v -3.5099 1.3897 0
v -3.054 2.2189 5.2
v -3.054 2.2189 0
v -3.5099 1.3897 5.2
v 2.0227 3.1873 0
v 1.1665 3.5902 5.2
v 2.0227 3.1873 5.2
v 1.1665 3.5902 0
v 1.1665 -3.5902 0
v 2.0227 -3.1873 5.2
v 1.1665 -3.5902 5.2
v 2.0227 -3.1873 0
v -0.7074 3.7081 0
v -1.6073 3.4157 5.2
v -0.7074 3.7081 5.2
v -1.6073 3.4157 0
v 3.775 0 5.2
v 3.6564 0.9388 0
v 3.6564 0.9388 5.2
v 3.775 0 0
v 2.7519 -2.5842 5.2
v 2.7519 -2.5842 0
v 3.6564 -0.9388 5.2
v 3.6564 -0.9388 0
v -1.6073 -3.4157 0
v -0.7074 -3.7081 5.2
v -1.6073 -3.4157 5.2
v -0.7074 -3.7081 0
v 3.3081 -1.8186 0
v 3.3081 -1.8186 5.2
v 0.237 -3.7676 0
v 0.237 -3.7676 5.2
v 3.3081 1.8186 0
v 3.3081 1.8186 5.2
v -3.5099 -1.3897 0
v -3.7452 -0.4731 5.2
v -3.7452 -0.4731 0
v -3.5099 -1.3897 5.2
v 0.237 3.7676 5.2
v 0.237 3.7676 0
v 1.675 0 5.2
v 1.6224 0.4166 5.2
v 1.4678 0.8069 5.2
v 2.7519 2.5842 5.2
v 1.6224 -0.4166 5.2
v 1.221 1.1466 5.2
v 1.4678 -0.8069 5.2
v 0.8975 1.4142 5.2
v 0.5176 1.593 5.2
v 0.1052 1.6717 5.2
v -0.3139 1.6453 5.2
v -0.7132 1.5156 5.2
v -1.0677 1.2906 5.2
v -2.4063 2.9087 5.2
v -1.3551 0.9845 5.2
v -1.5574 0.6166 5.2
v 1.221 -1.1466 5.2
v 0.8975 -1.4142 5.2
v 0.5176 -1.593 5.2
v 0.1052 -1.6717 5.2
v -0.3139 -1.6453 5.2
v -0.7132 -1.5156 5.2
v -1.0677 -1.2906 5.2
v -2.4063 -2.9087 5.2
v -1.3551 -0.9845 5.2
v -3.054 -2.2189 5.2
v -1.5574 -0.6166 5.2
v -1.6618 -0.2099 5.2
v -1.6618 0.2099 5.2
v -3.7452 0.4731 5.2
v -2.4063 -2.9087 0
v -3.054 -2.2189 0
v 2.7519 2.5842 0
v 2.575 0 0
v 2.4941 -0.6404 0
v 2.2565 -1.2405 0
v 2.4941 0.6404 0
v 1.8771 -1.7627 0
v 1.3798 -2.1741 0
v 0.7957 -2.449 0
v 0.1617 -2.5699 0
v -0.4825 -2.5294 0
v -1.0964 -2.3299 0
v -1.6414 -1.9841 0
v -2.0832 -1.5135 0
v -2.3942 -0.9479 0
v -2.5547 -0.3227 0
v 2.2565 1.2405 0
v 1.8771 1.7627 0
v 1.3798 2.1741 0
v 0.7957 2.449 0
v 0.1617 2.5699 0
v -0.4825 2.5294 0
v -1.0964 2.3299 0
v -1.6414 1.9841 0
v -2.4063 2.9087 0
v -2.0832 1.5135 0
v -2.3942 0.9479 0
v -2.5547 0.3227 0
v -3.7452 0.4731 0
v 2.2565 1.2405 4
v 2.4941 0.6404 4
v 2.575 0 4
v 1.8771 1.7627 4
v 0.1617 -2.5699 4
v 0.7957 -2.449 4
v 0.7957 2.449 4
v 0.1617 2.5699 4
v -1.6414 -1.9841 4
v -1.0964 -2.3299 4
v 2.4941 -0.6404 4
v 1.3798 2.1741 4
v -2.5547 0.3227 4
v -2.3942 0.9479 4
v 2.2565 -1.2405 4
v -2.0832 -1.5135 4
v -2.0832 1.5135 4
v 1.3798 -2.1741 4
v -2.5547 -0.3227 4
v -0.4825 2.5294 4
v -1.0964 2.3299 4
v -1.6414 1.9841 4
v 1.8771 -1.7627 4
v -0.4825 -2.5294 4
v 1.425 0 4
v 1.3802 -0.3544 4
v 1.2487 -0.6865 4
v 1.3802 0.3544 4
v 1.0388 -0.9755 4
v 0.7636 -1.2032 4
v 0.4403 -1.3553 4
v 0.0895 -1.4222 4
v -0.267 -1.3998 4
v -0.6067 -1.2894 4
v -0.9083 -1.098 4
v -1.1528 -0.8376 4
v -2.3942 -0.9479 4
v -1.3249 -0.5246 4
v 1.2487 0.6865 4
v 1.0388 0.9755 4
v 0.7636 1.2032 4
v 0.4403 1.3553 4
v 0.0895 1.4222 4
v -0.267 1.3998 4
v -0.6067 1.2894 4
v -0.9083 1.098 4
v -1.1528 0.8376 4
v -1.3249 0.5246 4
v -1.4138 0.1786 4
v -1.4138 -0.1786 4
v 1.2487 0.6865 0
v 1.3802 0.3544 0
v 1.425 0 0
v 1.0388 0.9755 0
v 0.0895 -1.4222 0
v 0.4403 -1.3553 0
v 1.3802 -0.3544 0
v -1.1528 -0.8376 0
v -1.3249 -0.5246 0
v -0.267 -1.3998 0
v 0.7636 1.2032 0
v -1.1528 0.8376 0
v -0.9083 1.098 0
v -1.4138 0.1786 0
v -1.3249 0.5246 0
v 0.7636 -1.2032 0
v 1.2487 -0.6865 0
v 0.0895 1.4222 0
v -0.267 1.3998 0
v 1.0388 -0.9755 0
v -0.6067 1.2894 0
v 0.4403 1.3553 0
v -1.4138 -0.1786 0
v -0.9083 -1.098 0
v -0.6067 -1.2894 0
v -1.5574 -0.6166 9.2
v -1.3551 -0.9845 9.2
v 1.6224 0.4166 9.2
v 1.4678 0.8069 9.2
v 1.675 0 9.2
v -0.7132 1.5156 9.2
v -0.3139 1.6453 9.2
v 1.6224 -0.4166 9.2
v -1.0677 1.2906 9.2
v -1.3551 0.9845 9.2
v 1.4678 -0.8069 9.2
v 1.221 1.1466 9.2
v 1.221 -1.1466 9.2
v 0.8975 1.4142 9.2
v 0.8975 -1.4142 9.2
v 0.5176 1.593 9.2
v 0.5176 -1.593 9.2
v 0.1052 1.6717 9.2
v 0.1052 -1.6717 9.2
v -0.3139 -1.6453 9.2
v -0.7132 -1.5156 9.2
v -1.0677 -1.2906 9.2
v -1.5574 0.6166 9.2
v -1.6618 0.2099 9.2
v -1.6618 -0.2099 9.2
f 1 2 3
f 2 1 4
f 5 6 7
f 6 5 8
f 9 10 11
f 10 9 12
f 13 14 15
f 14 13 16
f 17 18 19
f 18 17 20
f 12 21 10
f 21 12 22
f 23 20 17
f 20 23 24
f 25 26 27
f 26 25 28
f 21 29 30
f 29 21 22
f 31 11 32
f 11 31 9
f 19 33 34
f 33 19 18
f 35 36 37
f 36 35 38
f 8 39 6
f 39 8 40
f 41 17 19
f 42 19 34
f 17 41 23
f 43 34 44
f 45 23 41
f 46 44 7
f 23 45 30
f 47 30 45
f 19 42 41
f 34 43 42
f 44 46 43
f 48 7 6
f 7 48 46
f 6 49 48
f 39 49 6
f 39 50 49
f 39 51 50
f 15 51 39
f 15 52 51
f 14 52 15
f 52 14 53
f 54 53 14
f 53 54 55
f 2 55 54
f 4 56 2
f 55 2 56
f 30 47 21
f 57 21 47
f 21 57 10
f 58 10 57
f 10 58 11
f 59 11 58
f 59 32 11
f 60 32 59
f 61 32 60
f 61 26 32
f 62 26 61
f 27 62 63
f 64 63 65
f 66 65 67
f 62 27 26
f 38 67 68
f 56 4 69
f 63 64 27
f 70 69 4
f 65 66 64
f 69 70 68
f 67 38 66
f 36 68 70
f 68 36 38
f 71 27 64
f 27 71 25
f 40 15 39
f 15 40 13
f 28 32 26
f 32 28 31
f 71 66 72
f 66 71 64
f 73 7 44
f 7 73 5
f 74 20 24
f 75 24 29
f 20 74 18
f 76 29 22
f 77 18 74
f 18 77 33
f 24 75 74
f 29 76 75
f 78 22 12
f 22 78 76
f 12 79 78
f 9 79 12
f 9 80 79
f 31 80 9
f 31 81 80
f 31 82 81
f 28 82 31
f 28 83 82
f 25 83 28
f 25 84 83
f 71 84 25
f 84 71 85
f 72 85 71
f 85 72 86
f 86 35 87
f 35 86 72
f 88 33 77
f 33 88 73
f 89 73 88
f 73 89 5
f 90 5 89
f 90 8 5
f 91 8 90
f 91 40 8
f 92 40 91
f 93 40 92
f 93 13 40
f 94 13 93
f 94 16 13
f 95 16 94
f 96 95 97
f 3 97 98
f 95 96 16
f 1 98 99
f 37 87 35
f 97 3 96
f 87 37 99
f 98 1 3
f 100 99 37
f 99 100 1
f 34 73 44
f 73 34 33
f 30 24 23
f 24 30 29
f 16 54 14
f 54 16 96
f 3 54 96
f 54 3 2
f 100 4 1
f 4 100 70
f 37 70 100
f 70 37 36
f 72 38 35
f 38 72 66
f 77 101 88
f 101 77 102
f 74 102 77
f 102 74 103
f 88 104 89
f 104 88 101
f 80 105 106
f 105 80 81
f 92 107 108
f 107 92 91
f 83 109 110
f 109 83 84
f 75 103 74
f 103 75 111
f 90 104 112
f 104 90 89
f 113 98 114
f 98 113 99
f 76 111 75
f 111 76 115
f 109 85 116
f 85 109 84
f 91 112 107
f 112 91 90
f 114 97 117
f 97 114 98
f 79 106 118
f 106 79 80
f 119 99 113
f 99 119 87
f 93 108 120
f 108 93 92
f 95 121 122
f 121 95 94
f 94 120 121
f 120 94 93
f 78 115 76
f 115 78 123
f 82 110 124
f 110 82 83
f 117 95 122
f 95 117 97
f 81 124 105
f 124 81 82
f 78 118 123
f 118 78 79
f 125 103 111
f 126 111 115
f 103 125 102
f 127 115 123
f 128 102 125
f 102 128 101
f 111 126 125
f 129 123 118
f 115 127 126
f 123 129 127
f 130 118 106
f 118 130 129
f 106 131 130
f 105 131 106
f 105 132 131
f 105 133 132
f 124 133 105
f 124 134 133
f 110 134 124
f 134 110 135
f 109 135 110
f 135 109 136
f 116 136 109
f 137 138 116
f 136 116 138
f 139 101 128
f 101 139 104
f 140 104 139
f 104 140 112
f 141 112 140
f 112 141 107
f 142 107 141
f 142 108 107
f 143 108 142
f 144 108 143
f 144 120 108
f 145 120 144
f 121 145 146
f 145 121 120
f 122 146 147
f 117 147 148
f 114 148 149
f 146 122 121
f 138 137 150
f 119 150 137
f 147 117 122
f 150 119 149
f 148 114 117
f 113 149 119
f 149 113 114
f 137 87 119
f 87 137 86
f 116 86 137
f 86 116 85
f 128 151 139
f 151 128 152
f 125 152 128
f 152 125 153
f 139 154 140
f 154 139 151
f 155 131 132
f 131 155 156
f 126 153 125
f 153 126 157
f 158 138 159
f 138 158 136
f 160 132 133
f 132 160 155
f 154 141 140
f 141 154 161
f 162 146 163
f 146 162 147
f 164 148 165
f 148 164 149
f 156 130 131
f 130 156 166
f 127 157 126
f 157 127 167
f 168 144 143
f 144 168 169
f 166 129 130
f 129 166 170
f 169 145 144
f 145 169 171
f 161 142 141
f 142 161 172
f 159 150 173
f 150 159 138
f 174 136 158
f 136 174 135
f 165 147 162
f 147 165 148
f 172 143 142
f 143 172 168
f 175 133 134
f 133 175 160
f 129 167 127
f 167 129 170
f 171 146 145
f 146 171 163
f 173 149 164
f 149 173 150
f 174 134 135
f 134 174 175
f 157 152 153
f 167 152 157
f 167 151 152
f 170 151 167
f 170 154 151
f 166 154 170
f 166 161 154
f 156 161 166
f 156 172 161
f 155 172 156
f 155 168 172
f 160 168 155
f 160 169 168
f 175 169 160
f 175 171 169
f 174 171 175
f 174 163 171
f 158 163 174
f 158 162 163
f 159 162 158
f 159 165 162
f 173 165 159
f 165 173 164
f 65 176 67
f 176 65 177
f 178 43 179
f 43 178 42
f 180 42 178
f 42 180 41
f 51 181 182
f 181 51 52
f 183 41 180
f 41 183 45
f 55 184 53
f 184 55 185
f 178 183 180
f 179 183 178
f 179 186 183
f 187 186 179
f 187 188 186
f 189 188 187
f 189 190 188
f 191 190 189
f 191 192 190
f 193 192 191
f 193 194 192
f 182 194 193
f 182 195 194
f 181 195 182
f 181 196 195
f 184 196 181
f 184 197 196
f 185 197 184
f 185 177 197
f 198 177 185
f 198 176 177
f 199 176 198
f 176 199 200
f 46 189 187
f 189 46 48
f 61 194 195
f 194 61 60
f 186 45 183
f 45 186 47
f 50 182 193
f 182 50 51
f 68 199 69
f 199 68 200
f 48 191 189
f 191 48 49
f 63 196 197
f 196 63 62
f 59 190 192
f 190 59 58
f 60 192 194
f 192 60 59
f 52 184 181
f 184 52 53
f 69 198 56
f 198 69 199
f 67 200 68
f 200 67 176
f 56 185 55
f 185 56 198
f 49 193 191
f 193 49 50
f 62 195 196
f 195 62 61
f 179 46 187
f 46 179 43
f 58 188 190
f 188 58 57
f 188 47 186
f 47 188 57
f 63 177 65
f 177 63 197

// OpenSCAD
traxxasInnerDiameter = 3.35;
traxxasHeight        = 4;
tubeInnerDiameter    = 2.85;
tubeOutterDiameter   = 5.15;
tubeHeight = 4;
outterWall = 1.2;

fn=25;

union(){
  cylinder(r=tubeInnerDiameter/2, h= tubeHeight+outterWall, $fn=fn);
  translate([0,0,tubeHeight+outterWall])cylinder(r=traxxasInnerDiameter/2, h= traxxasHeight, $fn=fn);
  difference(){
    cylinder(r=tubeOutterDiameter/2+outterWall, h= tubeHeight+outterWall, $fn=fn);
    cylinder(r=tubeOutterDiameter/2, h= tubeHeight, $fn=fn);
  }
}
